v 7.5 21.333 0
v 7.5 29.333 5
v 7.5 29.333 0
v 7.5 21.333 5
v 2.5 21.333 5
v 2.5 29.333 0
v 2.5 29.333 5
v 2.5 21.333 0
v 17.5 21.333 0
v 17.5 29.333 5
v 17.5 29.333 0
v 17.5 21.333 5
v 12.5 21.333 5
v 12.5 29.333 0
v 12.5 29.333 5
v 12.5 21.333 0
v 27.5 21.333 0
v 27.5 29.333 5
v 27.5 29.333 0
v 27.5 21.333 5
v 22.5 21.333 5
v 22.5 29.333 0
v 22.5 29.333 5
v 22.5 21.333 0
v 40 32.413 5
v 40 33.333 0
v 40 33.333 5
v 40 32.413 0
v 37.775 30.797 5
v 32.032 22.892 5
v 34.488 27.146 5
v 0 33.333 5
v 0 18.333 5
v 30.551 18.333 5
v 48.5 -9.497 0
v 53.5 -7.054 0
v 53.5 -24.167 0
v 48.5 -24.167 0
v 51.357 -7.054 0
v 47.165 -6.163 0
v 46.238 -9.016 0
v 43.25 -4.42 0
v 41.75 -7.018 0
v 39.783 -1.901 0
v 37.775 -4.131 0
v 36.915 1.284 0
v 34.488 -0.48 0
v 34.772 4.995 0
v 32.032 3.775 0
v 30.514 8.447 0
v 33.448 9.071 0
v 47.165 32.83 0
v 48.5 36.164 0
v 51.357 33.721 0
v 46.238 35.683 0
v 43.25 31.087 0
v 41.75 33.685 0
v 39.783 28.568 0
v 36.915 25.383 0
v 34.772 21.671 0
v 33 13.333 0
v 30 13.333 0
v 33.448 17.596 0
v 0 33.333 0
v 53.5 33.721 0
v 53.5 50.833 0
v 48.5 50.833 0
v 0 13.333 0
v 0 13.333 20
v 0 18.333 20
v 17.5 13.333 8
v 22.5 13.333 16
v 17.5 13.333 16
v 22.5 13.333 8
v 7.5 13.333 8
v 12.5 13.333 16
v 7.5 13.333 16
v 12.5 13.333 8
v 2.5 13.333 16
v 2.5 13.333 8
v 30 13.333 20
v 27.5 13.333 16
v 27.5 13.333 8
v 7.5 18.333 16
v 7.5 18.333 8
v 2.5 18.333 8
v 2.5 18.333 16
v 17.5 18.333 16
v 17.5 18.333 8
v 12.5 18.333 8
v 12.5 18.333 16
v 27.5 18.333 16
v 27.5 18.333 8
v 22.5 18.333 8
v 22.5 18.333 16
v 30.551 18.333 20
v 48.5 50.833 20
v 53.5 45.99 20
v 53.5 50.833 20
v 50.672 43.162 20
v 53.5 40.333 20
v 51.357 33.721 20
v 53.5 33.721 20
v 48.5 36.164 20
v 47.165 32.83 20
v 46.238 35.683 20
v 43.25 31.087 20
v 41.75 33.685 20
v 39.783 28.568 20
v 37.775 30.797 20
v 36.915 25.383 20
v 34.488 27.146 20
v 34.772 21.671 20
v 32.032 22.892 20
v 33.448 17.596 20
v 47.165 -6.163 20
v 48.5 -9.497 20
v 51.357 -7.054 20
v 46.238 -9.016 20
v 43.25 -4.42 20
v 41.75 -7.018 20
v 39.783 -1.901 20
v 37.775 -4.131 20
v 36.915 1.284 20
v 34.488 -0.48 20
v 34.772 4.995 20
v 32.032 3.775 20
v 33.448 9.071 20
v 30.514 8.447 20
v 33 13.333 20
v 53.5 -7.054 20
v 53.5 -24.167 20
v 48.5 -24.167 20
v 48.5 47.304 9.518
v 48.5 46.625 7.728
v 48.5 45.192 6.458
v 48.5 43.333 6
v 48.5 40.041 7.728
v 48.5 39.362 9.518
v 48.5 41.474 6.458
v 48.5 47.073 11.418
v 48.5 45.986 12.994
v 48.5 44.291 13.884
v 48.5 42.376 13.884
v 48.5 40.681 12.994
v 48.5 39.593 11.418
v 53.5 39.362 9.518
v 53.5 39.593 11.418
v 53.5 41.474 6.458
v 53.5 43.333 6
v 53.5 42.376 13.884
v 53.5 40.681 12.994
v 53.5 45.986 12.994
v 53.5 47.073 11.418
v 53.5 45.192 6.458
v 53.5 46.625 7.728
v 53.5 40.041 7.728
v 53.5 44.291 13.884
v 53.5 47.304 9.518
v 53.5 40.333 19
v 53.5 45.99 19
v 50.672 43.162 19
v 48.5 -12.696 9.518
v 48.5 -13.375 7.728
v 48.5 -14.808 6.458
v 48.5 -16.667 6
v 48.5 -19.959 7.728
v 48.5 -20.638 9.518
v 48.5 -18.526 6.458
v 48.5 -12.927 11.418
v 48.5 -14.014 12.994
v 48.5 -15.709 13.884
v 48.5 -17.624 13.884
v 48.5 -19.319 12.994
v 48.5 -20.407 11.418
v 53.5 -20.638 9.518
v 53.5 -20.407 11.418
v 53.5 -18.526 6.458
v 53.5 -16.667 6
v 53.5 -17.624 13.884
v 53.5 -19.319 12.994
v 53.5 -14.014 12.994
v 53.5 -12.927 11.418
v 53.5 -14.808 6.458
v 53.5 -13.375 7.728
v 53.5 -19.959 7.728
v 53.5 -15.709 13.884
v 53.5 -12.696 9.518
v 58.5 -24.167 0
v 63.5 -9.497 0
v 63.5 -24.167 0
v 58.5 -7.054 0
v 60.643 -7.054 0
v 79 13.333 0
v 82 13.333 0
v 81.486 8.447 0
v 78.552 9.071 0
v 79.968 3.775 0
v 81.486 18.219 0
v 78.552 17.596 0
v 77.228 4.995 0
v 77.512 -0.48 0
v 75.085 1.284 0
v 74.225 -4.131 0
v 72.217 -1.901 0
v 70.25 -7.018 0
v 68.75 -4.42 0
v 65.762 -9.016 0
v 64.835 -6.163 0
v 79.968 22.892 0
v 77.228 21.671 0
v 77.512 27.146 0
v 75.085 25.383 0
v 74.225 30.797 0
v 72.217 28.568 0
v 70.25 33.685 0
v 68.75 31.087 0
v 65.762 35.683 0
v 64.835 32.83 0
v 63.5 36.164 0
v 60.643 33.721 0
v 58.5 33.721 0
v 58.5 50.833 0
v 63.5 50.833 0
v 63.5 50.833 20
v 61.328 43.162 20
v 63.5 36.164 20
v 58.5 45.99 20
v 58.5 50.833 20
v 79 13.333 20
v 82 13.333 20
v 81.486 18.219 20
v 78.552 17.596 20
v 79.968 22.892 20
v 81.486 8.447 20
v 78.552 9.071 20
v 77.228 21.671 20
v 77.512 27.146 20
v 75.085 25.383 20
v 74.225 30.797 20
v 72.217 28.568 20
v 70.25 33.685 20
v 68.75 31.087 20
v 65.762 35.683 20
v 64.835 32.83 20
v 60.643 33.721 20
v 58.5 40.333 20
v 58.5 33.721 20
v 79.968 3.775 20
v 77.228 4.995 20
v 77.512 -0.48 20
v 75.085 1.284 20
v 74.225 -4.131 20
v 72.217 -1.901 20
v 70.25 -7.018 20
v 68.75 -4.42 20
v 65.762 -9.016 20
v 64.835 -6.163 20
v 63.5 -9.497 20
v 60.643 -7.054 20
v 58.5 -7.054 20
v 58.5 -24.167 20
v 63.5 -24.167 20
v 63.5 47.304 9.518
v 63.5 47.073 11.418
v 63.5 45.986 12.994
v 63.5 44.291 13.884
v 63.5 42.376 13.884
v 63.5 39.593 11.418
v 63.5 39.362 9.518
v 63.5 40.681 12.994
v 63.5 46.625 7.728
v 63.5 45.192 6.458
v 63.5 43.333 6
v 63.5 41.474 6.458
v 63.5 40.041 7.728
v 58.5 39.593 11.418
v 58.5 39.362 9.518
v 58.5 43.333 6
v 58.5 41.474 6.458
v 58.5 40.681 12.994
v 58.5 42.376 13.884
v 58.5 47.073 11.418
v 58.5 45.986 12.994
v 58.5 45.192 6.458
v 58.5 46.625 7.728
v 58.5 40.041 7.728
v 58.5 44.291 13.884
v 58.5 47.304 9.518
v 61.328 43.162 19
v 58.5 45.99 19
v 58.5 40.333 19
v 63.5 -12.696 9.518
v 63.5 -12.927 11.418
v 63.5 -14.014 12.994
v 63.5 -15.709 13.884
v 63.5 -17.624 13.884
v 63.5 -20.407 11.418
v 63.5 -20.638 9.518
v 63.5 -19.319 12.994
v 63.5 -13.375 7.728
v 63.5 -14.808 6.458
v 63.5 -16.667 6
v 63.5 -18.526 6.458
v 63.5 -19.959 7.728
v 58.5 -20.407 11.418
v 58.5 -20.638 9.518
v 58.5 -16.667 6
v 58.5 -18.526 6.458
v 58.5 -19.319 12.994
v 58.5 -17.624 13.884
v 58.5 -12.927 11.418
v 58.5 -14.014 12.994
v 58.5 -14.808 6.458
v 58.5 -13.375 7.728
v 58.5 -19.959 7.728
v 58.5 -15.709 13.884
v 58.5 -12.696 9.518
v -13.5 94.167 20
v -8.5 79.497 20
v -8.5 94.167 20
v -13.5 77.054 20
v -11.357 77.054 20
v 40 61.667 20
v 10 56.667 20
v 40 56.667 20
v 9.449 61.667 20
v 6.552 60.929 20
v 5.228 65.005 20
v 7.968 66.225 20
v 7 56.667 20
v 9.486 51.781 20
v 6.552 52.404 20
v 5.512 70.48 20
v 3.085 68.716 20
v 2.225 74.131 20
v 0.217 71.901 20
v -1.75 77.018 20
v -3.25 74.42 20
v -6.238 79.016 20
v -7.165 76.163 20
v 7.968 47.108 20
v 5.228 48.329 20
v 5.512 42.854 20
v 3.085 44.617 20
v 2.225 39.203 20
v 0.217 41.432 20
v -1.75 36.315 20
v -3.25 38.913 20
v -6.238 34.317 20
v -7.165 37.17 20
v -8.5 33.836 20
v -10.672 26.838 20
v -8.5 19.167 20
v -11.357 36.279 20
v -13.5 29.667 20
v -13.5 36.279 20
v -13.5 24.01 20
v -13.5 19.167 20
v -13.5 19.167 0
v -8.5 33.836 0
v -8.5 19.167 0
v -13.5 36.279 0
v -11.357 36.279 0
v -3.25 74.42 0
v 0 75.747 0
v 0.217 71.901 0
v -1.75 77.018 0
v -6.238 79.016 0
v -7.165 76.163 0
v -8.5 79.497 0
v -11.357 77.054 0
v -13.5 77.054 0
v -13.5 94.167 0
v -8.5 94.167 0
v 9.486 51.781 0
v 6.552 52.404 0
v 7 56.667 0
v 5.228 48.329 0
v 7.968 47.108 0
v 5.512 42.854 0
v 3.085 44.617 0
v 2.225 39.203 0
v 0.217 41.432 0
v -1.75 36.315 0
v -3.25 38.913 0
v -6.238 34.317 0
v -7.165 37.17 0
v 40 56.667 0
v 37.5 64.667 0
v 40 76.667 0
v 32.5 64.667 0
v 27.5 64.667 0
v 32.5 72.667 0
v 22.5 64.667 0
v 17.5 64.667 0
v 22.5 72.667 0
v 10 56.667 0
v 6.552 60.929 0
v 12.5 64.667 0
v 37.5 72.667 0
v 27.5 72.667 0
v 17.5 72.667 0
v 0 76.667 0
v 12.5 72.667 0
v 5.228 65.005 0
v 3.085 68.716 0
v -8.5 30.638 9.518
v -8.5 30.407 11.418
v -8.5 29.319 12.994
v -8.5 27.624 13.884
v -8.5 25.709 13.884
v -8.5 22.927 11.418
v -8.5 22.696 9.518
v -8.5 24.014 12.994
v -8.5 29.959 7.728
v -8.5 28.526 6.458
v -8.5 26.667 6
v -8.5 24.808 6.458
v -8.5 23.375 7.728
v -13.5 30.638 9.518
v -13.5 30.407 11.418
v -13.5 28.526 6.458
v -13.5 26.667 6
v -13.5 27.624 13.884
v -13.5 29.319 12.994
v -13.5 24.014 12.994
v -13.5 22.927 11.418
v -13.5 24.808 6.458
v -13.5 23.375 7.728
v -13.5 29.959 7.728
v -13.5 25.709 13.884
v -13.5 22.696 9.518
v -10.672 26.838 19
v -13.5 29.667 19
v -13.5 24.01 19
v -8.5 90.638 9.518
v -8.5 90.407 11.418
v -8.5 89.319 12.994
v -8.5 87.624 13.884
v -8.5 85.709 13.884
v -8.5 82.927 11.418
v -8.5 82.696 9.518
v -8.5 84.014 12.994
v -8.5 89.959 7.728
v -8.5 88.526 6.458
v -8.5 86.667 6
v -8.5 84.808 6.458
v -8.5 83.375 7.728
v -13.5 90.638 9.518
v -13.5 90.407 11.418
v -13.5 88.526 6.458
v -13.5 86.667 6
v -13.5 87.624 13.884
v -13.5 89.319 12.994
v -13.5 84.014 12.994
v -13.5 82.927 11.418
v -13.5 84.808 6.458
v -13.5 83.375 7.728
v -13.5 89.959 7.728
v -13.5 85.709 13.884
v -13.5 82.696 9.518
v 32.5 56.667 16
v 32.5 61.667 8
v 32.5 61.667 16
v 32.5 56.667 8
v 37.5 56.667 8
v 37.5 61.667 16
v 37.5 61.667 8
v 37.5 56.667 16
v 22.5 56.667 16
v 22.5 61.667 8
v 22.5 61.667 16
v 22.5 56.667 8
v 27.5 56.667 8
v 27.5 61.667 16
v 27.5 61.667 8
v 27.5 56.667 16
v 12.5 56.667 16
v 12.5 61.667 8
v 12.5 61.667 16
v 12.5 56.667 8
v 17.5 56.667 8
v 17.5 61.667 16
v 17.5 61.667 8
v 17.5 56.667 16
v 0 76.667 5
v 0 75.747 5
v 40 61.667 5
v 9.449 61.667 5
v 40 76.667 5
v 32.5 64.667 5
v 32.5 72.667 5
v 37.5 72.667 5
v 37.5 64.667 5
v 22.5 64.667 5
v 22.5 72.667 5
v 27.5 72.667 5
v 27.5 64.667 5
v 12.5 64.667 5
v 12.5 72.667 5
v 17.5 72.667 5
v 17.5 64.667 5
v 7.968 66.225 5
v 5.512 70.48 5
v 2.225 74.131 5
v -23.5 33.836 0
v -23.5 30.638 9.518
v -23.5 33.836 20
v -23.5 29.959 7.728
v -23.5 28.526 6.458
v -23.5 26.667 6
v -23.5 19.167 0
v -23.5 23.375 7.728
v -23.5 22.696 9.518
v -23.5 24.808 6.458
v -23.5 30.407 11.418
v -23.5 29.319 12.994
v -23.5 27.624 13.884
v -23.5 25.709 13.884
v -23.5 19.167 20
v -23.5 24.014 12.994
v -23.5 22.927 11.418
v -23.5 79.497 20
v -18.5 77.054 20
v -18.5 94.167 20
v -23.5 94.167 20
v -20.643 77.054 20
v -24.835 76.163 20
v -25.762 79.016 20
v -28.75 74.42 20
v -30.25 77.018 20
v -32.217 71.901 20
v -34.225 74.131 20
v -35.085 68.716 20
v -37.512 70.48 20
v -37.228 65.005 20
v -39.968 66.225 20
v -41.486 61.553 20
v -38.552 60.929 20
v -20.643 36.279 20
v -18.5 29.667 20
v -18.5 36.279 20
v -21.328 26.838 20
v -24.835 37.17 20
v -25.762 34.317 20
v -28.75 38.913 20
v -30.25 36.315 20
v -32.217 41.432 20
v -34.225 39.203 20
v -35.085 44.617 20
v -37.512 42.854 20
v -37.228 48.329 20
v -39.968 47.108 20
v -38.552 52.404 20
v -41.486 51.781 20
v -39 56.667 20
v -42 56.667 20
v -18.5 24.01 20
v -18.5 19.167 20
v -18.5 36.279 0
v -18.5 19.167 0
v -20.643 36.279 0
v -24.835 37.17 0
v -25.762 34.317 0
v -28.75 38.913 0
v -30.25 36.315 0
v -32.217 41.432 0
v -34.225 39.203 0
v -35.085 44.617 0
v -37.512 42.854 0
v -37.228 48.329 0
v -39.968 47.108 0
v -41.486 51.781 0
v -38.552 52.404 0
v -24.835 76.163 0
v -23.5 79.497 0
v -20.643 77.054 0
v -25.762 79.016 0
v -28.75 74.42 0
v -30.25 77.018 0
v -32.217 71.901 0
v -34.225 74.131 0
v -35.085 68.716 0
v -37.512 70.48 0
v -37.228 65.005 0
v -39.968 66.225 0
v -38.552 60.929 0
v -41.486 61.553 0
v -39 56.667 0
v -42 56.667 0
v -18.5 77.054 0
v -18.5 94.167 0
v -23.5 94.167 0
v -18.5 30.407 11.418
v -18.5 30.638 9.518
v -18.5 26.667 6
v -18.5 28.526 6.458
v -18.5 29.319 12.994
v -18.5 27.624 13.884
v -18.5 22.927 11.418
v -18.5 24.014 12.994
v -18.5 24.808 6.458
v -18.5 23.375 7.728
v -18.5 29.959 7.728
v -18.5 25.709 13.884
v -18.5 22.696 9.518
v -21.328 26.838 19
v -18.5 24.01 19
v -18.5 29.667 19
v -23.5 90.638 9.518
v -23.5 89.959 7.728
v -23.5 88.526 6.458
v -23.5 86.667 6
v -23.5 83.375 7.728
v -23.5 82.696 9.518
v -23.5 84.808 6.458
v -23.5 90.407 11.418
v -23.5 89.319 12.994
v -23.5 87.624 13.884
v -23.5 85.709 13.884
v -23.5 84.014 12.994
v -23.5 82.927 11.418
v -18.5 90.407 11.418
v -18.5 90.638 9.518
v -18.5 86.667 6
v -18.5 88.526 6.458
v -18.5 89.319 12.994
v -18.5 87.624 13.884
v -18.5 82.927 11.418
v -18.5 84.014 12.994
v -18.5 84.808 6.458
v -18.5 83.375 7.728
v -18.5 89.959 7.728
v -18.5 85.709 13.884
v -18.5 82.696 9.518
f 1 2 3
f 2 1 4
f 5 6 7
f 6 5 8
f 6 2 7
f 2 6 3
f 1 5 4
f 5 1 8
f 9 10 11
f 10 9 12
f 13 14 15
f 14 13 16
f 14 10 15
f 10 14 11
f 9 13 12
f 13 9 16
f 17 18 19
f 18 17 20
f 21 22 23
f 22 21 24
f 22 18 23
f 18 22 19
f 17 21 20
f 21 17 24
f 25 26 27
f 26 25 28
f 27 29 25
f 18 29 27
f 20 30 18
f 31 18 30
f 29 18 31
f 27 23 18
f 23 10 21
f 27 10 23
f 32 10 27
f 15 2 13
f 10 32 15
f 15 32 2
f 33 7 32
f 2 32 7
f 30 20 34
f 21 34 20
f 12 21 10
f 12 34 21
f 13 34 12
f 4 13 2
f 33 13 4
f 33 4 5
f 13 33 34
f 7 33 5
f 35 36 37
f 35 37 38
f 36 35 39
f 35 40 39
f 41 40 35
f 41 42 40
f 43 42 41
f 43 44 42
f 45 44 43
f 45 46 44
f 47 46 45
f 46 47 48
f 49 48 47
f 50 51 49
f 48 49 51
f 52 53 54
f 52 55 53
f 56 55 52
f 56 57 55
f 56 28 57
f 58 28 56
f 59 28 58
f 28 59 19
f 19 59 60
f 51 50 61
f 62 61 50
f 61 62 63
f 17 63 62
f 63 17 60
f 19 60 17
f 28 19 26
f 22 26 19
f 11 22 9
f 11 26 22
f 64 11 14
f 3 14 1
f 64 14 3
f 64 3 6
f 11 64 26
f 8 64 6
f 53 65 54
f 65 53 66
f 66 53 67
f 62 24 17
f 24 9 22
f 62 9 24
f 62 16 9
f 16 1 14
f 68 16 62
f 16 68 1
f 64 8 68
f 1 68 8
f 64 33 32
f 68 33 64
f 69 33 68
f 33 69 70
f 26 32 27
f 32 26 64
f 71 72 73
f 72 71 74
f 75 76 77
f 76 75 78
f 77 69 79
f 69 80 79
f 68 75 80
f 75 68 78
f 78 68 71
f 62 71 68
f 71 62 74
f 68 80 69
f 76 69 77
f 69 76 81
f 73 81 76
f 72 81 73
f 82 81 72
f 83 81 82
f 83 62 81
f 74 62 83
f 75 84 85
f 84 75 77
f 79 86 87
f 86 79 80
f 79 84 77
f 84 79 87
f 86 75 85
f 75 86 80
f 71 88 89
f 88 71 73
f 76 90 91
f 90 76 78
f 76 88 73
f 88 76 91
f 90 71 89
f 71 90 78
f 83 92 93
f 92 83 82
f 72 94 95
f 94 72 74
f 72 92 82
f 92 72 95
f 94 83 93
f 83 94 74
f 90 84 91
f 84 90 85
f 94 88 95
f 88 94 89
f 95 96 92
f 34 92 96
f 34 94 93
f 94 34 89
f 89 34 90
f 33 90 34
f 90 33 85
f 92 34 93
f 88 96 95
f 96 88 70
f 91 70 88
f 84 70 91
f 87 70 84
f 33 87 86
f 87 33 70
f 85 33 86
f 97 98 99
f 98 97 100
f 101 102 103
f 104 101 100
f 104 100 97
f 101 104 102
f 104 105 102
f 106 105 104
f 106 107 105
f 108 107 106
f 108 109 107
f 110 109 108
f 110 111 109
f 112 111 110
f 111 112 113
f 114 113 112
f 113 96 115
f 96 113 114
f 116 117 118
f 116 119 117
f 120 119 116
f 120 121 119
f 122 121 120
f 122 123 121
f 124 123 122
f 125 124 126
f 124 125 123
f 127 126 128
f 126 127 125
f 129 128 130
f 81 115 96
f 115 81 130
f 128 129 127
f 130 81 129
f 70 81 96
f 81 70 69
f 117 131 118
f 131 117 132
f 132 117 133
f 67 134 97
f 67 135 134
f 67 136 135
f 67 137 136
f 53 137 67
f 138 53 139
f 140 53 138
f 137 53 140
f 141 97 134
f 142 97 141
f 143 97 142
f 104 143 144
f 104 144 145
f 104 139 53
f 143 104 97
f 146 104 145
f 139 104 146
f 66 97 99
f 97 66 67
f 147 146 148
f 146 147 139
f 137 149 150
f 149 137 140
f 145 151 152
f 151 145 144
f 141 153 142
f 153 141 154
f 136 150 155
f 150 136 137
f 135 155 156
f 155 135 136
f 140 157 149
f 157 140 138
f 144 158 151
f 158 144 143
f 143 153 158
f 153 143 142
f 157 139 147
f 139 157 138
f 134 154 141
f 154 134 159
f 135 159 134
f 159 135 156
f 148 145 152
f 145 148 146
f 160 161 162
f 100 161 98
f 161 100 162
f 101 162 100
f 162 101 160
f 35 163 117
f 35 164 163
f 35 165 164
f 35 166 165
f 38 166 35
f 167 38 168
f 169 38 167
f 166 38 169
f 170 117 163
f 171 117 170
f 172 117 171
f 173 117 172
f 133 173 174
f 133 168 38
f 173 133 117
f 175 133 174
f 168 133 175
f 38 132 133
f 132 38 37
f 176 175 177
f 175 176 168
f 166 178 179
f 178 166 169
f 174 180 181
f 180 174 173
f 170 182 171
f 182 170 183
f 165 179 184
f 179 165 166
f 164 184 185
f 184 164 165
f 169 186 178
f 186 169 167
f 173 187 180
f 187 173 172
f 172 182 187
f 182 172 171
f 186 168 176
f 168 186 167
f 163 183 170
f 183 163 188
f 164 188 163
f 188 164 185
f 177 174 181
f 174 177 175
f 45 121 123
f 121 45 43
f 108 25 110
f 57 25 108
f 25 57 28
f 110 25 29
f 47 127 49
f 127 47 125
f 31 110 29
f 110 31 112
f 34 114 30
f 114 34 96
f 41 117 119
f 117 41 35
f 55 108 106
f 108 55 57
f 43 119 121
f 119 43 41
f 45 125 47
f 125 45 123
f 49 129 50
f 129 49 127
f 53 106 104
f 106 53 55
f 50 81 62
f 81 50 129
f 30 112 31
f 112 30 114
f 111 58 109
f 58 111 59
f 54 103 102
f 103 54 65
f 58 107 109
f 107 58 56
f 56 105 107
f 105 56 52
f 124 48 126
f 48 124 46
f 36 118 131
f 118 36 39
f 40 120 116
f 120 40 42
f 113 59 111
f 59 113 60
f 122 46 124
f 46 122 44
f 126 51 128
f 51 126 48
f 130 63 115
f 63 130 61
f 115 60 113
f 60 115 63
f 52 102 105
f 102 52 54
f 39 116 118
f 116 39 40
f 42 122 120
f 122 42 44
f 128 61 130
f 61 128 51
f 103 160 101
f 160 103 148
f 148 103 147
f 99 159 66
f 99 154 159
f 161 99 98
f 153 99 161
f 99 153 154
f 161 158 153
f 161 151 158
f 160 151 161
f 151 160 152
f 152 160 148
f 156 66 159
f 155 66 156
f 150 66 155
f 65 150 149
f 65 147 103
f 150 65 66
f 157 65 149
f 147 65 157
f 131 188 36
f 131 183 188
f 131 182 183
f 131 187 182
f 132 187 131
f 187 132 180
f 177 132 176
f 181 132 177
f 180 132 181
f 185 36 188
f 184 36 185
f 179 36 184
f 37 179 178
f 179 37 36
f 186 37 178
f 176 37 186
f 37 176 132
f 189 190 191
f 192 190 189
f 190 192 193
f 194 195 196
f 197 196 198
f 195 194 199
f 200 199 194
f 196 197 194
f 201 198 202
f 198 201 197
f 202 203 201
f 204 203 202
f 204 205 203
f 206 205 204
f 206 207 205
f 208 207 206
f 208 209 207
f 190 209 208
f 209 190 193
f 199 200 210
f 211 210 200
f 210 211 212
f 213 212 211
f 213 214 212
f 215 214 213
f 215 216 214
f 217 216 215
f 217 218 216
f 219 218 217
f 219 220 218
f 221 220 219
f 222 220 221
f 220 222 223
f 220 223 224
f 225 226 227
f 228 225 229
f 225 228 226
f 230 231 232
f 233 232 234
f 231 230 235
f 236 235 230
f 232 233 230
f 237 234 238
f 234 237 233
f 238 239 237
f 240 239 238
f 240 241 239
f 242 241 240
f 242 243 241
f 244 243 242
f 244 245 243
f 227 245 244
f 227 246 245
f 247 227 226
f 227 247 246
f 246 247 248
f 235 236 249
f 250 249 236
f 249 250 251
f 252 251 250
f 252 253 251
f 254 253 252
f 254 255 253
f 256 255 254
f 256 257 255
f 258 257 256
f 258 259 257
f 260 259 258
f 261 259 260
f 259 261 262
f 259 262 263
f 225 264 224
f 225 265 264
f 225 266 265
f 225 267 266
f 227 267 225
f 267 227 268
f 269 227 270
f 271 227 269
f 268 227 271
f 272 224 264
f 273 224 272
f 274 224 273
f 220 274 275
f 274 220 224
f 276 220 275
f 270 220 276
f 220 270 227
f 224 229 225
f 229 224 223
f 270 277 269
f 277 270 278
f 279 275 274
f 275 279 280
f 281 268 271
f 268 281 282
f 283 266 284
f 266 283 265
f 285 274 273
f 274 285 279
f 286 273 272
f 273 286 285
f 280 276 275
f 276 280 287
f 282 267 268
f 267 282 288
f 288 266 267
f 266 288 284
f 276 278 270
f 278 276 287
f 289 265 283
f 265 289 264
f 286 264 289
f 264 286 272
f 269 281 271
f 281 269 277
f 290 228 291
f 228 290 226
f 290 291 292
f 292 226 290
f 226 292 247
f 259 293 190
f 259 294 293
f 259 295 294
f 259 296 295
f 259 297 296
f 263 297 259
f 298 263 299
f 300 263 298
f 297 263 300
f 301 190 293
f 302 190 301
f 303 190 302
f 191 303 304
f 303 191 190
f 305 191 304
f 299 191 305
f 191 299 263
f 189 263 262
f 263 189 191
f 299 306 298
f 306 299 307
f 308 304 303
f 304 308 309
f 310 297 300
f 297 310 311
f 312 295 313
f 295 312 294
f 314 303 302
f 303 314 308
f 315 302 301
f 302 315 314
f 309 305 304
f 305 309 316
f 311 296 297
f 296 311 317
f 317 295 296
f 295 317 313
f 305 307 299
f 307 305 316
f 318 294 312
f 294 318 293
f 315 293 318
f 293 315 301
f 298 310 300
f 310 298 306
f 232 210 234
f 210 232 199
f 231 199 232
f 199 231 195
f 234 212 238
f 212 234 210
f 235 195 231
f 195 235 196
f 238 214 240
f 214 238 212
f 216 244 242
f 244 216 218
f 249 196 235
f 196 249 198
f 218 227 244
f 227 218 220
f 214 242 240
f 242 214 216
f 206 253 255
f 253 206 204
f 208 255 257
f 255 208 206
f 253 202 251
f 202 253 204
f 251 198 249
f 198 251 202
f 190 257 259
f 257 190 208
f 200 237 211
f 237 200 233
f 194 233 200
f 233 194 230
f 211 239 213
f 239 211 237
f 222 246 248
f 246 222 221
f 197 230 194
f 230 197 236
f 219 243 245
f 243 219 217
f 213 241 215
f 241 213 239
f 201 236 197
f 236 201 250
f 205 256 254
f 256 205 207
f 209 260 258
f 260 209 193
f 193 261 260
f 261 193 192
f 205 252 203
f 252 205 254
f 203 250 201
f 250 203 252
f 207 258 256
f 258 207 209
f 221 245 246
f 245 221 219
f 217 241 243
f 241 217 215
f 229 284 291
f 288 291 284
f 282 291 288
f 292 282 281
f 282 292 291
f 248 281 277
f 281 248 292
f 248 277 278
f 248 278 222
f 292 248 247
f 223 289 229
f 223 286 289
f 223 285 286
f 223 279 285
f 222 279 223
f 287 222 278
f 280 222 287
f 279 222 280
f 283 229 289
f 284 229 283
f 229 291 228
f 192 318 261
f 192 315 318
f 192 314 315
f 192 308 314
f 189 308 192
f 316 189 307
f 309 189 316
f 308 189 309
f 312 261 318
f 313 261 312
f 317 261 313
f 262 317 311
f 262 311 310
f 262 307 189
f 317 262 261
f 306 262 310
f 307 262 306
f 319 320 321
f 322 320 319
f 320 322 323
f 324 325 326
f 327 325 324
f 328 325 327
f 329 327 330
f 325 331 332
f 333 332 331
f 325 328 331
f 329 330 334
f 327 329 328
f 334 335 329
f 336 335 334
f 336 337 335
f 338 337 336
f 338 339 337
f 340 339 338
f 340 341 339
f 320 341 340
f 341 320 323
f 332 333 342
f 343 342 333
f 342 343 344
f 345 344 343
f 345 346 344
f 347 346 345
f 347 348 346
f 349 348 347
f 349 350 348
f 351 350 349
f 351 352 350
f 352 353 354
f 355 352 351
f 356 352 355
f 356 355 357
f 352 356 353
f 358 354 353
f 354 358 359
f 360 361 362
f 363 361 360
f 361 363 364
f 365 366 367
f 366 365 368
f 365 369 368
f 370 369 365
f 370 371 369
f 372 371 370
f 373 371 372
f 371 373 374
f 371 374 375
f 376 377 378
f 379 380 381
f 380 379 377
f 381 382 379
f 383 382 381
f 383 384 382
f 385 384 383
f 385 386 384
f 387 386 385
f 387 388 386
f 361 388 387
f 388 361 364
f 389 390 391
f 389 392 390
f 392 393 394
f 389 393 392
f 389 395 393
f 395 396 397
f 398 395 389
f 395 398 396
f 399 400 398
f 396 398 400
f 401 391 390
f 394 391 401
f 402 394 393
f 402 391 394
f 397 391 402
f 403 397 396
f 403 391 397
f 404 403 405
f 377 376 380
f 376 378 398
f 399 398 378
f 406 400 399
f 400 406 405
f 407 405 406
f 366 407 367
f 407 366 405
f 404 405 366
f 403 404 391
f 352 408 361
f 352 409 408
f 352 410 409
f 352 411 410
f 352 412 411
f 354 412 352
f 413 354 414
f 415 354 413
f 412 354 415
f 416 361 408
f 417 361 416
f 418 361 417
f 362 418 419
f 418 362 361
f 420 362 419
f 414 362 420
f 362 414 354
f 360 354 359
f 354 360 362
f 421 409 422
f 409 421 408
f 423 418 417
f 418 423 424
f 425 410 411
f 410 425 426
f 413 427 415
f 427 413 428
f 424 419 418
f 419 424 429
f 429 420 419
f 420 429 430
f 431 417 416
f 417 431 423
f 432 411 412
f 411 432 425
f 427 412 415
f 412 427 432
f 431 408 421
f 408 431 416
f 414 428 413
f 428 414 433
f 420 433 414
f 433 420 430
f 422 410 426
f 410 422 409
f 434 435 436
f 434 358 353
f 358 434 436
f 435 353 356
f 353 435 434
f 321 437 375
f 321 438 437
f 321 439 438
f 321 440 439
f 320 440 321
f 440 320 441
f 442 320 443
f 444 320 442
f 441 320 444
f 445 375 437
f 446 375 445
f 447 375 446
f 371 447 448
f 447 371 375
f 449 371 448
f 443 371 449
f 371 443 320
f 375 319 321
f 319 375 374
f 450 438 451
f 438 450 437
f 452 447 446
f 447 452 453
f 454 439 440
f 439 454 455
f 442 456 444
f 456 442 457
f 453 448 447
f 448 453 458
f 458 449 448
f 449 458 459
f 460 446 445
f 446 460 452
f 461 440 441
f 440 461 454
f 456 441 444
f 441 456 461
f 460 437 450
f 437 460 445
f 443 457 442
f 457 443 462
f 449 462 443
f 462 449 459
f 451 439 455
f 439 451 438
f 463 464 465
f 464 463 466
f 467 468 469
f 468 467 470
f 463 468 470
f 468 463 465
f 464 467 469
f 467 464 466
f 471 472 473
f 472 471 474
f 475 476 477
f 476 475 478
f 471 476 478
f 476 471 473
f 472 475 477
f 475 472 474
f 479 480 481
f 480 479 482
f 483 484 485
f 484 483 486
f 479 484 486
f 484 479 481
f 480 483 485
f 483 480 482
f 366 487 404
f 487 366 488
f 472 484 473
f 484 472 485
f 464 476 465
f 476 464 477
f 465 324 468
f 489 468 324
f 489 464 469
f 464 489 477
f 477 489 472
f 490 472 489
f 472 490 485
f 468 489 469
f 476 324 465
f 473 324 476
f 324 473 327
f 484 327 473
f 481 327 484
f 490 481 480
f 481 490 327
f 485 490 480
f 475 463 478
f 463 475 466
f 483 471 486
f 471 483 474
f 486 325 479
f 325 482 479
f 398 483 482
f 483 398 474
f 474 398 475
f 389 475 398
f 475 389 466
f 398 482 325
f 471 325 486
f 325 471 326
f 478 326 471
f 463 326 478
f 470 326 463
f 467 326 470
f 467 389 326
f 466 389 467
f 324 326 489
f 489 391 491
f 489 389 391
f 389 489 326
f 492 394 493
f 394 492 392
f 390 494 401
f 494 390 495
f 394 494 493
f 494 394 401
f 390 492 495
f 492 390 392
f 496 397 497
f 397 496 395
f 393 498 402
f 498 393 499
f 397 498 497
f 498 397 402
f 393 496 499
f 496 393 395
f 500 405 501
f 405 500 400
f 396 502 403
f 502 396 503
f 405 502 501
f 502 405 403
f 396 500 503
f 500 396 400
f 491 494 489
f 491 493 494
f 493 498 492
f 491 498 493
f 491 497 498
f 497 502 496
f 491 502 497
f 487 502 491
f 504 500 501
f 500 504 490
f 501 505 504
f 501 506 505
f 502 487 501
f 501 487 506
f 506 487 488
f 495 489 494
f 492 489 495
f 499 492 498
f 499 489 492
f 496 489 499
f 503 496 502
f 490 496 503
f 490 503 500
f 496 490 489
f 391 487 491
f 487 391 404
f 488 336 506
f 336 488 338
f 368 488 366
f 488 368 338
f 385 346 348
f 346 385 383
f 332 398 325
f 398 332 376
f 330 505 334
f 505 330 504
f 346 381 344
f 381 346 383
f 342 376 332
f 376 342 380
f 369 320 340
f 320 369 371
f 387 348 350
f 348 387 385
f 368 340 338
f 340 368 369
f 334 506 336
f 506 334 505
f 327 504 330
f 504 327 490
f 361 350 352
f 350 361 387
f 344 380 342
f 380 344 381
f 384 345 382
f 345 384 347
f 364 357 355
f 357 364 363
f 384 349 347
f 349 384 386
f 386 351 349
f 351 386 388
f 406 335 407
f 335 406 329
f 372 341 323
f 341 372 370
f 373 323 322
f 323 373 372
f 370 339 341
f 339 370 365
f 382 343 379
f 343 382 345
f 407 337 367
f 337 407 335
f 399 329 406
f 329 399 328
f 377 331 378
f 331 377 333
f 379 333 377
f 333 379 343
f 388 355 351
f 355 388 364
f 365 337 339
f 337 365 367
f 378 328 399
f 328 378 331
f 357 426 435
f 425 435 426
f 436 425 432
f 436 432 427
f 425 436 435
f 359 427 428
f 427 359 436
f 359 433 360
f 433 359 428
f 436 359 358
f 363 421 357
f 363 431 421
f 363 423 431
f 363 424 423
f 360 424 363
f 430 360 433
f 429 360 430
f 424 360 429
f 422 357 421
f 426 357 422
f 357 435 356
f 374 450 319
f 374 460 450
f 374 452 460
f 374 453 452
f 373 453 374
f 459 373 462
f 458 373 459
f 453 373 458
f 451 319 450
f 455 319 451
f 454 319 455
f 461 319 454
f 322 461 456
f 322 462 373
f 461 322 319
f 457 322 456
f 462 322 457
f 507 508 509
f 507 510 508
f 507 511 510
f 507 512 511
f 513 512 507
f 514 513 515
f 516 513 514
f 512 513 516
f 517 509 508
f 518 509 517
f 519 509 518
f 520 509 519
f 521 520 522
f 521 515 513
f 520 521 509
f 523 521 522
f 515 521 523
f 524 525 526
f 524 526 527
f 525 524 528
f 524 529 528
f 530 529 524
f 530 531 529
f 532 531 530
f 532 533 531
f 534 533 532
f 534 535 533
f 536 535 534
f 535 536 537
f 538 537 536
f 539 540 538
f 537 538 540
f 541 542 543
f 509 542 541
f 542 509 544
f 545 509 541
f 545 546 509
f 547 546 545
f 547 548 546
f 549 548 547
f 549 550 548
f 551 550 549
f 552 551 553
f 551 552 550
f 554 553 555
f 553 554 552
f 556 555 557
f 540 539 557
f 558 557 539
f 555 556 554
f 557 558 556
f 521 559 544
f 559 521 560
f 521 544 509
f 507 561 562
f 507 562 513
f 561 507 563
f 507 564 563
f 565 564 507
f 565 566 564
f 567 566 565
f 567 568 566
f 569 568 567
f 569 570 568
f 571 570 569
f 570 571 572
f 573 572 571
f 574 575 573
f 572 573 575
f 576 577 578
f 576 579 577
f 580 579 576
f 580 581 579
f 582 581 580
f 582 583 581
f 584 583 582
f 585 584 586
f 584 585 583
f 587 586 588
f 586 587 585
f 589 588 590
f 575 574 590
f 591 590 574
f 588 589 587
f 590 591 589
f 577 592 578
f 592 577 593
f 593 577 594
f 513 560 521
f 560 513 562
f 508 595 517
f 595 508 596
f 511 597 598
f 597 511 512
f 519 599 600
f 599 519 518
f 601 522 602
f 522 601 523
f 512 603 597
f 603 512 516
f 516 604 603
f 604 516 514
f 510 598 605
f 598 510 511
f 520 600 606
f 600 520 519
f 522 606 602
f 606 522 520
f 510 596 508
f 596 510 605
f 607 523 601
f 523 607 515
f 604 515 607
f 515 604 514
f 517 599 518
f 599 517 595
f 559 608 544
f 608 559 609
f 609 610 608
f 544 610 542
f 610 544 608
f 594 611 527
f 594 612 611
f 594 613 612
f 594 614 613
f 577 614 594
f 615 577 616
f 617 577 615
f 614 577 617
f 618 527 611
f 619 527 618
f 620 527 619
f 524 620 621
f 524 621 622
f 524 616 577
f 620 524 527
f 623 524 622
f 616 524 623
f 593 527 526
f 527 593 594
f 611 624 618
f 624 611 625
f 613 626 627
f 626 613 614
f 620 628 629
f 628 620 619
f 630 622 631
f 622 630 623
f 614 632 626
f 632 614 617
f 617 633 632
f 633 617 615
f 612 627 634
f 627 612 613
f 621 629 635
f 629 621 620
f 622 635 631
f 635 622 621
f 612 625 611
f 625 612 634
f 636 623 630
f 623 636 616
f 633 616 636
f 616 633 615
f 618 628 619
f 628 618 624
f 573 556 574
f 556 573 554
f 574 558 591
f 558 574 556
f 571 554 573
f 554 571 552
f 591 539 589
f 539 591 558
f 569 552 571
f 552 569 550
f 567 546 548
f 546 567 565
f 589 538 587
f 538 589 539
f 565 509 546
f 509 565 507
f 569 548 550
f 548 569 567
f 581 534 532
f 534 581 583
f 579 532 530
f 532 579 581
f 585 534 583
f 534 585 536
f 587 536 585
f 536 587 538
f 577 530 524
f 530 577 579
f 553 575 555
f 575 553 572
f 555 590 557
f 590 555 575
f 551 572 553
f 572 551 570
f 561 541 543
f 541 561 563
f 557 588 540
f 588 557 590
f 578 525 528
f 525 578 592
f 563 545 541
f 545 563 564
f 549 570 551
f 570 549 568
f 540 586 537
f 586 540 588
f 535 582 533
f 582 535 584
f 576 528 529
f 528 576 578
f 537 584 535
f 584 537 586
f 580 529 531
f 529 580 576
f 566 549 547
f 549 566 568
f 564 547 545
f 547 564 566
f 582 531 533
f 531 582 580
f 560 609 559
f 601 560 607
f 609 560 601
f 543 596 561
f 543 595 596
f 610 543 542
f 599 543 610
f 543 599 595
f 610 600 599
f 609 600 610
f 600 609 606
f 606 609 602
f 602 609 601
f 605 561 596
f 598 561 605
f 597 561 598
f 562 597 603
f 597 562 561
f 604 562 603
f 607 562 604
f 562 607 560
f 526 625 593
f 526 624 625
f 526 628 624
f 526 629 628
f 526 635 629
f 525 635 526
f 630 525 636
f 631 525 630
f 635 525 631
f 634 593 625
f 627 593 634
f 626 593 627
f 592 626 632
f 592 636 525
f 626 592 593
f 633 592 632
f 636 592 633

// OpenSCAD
/*
 * This code is licensed under the CC BY-NC-SA 4.0 (Attribution-NonCommercial-ShareAlike).
 * Please read LICENCE.md for full details.
 *
 * This is specific to my use case but this provides the means to attach our angle
 * brackets to an existing rack system.
 *
 * In my case this is plastic racking from a DIY store which has a 40mm diameter round
 * posts which this wraps around.
 *
 * It's here so we have an example of how to make custom mounts for other types of racking.
 *
 * Note: This is the raw original and hasn't been converted to use the common modules
 *       so there are some duplication. At some point I might clean this one up
 *       but as this is custom I've left it as is.
 */

/*
 * Mounting bracket
 */
width=40;
height=20;
t=5;

module warpDisk(x,y) {
    translate([x,y,0]) cylinder(r=5,h=.6,$fn=30);
}

/*
 * holderDiam is the diameter of round holder.
 * Adjust this to be the inner diameter you are attaching the bracket to.
 * This doesn't need to be accurate but close & bigger the better.
 *
 * holderThickness is the thickness in mm of the bracket. Doesn't need to be
 * too thick but not too think that it'll break. 2 or 3mm is usually enough.
 */
holderDiam=41;
holderThickness=3;

module bracket( top ) {
    rotate([ 90*top, 0, 0]) union() {
        slottedPanel();
        rotate([90,0,0]) translate([0,0,-t]) slottedPanel();
    }
    /*
    warpDisk(-3,-3);
    warpDisk(-3,height+3);
    warpDisk(width+3,-3);
    warpDisk(width+3,height+3);
    */

    //translate([t/2,0,0]) rotate([0,-90,0]) sideBracket();
    //translate([width,0,0]) rotate([0,-90,0]) sideBracket();
}

module slottedPanel() {
    difference() {
        cube([width,height,t]);
        for( n = [0:2] ) {
            translate([2.5+(10*n),8,-1]) {
                cube([5,8,10]);
            }
        }
    }
}


/*
 * Handles the rendering of the round holder bracket.
 *
 * This module renders each side of the part that attaches to a round post.
 *
 * side 0=left, 1=right to show/render
 * top  1=top, 0=bottom
 */
module roundHolder(side, top) {
    // Thickness of mount wall
    thickness=4;

    // Height of mount
    h=height;

    hr = (holderDiam/2)+holderThickness;

    x = width*3/4+(holderDiam/2)+holderThickness;
    y = width/3;
    difference() {
        // Union of the outer cylinder and the bracket
        union() {
            // bracket
            translate([ 0, y, 0]) bracket( top );

            // Outer cylinder
            translate([x,y,0])
                cylinder( r=hr, h=h, $rn=120 );

            // cylinder bolt mount
            translate([ x-5, y+hr-1, 0]) cylinderBoltMount(1);
            translate([ x-5, y-hr-15+1, 0]) cylinderBoltMount(0);
        }

        // Difference with the inner cylinder
        translate([x,y,-1])
            cylinder( r=holderDiam/2, h=h+2, $rn=120 );

        // Cut away the unwanted half
        translate([side ? 0 : x, y-hr-15, -1])
            cube([ side ? x : hr+10, (hr+15)*2, h+2 ]);
    }
}

/*
 * The bolt mount used to hold each half together
 *
 * align = 1 to show alignment marker
 */
module cylinderBoltMount( align ) {
    difference() {
        cube([ 10, 15, height ]);

        // Bolt hole
        translate([ -1, 15/2, height/2])
            rotate([ 0, 90, 0])
                cylinder( r=4, h=12, $rn=120 );

        // Alignment hole
        if( align ) {
        translate([5,4.5,height+1])
            rotate([0,90,45])
                cube([2,4,4]);
        }
    }
}

//cylinderBoltMount();
//bracket();
for ( n = [0:1] ) {
    rotate( [0, 0, 180*n] )
    translate([ -40*n, -70*n, 0 ])
    union() {
        roundHolder(0, n);
        translate([5,0,0]) roundHolder(1, n);
    }
}
